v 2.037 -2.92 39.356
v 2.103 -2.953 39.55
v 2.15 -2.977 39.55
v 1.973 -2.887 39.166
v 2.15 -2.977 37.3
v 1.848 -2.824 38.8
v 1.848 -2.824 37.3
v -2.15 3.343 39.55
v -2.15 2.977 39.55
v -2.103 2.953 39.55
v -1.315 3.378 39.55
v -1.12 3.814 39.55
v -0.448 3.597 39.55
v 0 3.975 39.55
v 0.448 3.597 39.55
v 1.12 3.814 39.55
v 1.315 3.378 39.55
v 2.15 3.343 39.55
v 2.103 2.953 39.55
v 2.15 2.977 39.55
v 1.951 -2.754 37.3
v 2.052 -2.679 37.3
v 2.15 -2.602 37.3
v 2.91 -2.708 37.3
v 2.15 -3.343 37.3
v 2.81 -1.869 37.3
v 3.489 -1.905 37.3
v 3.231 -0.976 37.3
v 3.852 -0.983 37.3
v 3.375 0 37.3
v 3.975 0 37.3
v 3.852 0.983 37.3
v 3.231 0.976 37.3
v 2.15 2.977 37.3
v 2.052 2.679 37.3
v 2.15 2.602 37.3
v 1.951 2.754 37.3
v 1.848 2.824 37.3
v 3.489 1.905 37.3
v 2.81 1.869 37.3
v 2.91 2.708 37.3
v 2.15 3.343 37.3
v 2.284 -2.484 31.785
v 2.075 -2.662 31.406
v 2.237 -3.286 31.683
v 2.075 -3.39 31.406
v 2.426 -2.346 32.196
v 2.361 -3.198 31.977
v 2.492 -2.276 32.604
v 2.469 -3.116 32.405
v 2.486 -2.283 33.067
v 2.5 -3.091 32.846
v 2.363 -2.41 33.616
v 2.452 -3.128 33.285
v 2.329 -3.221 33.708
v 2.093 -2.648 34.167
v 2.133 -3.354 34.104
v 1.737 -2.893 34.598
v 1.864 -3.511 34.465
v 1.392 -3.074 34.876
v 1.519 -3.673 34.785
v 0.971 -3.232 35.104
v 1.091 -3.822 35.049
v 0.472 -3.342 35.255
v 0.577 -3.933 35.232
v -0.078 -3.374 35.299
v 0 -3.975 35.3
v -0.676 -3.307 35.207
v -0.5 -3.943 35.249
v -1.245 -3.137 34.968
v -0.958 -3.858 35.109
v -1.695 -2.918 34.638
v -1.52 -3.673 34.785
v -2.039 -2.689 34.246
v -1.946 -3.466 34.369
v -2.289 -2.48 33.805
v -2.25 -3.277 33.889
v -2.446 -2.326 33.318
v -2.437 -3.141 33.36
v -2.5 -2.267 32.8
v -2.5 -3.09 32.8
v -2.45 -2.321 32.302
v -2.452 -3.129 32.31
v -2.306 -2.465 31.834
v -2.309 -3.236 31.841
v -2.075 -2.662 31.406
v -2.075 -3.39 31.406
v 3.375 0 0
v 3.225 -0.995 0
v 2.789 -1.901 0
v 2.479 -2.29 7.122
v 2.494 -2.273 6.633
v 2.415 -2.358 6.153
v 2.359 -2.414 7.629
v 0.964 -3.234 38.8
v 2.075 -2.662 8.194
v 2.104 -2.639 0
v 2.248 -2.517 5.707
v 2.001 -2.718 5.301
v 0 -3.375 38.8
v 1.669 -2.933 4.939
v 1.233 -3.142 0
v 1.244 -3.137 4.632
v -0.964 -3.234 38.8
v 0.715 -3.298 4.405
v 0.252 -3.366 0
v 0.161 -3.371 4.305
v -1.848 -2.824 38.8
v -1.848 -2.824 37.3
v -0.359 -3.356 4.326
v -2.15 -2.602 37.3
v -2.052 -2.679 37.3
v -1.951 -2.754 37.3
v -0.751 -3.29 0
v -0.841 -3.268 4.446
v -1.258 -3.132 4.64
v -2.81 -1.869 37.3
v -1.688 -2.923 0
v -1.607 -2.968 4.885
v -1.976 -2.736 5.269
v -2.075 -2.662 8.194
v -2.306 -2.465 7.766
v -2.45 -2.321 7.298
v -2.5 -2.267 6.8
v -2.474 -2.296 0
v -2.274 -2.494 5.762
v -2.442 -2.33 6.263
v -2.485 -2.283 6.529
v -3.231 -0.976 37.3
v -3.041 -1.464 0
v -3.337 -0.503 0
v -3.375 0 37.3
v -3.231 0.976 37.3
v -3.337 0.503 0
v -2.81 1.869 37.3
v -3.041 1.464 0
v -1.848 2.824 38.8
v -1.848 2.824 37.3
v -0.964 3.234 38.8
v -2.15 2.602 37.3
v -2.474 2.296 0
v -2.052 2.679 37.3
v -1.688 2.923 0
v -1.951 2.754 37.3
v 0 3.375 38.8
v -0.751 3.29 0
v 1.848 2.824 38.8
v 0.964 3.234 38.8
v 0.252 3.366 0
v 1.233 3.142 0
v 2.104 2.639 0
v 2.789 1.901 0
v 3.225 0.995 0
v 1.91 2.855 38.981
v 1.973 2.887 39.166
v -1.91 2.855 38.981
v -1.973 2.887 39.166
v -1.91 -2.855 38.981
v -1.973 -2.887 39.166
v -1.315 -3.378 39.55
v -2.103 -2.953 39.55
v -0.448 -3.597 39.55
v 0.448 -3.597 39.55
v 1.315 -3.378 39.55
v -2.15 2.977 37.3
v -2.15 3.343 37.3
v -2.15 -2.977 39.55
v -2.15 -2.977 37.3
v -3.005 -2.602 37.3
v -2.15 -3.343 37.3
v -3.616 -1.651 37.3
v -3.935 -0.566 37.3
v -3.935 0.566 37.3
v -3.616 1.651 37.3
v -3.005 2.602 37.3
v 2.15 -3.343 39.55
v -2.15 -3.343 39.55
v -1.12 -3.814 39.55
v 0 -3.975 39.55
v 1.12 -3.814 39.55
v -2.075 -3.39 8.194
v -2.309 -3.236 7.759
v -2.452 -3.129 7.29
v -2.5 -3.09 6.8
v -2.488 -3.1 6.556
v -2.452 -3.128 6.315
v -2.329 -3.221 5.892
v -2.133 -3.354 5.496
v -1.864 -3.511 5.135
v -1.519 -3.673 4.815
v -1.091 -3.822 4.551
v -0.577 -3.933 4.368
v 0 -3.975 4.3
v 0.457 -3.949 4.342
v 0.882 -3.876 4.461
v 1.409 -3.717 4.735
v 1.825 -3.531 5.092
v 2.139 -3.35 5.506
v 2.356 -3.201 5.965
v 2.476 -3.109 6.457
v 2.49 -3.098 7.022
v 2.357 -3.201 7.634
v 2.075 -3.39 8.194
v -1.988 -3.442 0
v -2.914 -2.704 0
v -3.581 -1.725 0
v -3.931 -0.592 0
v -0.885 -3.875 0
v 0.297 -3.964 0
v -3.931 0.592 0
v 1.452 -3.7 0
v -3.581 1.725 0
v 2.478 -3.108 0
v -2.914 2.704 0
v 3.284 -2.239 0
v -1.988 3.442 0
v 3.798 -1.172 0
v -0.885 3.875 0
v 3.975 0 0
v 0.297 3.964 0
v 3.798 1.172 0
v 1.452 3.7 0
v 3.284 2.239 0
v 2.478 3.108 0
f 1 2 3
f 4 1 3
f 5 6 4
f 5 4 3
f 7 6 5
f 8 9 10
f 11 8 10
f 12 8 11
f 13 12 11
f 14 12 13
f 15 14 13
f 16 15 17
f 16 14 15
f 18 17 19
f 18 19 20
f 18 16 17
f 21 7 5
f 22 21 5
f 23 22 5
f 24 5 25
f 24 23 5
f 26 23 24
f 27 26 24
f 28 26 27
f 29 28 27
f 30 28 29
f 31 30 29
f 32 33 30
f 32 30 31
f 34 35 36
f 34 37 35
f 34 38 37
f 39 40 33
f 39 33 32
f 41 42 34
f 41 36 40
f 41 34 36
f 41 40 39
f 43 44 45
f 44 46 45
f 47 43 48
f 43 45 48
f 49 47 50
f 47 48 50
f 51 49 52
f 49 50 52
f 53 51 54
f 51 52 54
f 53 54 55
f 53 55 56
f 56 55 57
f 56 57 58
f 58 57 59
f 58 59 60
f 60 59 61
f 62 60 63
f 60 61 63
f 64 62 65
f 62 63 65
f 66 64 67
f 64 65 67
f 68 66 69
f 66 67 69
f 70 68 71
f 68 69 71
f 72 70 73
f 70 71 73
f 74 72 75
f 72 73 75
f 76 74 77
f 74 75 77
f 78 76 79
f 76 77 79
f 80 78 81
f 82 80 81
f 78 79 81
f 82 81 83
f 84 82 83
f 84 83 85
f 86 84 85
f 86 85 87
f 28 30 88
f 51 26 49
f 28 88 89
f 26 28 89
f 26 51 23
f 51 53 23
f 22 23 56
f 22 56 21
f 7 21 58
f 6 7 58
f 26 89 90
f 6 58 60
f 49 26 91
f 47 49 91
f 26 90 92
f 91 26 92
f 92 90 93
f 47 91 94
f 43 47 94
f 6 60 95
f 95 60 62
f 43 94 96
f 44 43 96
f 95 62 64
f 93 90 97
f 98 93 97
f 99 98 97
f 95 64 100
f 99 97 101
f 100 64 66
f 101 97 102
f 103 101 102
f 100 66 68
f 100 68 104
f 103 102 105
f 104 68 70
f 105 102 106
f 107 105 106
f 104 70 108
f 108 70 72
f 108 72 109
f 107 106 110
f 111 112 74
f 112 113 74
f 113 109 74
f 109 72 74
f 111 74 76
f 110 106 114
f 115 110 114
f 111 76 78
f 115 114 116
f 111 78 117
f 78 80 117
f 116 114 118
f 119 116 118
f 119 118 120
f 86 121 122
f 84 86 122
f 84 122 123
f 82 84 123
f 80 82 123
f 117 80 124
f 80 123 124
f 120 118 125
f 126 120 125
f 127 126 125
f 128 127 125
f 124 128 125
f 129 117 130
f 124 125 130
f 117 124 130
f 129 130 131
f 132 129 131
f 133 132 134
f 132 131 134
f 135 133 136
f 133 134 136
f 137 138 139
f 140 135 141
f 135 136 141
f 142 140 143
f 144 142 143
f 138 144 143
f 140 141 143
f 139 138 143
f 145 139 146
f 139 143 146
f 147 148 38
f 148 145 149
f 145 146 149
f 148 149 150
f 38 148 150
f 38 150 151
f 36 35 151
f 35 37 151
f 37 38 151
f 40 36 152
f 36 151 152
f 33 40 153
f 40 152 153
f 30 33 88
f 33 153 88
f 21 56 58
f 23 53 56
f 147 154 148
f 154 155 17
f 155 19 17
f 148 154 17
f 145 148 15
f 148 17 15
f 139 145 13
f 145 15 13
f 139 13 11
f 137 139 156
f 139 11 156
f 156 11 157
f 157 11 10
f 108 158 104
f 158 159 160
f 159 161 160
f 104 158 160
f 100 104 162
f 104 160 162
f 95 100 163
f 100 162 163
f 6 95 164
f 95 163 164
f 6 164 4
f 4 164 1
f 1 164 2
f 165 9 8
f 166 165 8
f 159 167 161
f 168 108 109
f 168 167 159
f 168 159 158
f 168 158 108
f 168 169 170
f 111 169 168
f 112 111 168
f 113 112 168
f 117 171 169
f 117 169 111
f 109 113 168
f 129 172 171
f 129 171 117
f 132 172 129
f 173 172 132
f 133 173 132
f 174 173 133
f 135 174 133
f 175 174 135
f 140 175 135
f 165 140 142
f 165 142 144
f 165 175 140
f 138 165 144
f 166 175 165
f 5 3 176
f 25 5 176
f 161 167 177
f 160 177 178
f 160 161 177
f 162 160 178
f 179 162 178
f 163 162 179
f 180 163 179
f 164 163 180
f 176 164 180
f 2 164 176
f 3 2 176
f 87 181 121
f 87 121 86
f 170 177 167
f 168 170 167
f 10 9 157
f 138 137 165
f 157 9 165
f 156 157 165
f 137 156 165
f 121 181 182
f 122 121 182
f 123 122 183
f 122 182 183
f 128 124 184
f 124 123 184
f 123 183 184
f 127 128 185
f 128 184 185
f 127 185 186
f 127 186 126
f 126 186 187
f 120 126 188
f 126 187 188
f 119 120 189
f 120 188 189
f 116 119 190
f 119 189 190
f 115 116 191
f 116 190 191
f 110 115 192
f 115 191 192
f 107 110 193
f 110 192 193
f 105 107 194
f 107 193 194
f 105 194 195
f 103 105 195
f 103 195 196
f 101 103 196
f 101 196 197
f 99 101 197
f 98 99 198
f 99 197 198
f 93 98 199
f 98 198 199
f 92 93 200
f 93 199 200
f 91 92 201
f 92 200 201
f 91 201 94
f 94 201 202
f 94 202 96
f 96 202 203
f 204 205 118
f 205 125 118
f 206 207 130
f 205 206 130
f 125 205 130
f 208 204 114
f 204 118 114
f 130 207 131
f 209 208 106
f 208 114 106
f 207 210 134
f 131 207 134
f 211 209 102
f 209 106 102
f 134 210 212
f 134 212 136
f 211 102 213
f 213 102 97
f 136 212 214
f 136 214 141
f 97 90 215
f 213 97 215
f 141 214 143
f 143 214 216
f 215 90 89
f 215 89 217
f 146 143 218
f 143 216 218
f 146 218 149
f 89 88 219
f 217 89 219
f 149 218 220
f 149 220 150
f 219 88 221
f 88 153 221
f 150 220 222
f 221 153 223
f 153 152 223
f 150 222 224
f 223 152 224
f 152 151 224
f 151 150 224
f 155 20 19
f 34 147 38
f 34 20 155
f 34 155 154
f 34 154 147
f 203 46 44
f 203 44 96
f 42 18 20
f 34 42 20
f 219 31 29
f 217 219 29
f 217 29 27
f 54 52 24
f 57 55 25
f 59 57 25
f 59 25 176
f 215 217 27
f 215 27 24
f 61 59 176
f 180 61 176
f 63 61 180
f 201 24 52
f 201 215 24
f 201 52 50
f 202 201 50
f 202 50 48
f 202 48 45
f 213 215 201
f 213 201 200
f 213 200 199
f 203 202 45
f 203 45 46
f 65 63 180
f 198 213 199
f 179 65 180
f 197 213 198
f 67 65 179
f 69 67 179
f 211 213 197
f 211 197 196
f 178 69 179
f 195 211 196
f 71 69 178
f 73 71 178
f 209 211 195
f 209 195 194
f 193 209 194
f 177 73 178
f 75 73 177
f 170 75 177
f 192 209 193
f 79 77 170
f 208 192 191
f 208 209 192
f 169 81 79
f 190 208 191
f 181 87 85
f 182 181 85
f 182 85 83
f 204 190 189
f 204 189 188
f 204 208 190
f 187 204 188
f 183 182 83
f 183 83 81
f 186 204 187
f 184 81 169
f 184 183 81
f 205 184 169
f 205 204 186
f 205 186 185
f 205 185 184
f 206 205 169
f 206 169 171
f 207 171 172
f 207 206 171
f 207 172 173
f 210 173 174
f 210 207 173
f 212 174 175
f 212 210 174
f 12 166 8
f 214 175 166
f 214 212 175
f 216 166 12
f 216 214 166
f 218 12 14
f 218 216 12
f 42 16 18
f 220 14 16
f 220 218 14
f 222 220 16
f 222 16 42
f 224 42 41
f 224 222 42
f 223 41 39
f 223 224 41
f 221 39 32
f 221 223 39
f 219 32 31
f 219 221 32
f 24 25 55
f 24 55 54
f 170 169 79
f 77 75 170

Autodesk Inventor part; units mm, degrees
ref_plane "YZ Plane" through (0, 0, 0) normal (1, 0, 0) x (0, 1, 0)
sketch "Sketch1" plane through (0, 0, 0) normal (0, 0, 1) x (1, 0, 0)
  circle A0 centre (0, 0) radius 3.975
  circle A1 centre (0, 0) radius 3.375
  dimension "d0" = 7.95
  dimension "d1" = 0.6
extrude "Extrusion1" add sketch "Sketch1" along normal blind 39.55
ref_plane "Work Plane1" through (0, -3.975, 0) normal (0, 1, 0) x (-1, 0, 0)
sketch "Sketch2" plane through (0, -3.975, 0) normal (0, 1, 0) x (-1, 0, 0)
  line L0 (0, 0) -> (0, 6.8) construction
  line L1 (0, 6.8) -> (0, 32.8) construction
  circle A0 centre (0, 32.8) radius 2.5
  circle A1 centre (0, 6.8) radius 2.5
  line L2 (2.075, 32.8) -> (-2.075, 32.8)
  line L3 (-2.075, 32.8) -> (-2.075, 6.8)
  line L4 (-2.075, 6.8) -> (2.075, 6.8)
  line L5 (2.075, 6.8) -> (2.075, 32.8)
  dimension "d4" = 6.8
  dimension "d5" = 26
  dimension "d6" = 5
  dimension "d7" = 4.15
extrude "Extrusion2" cut sketch "Sketch2" along normal up to surface
ref_plane "Work Plane2" through (0, 0, 37.3) normal (0, 0, -1) x (-1, 0, 0)
sketch "Sketch3" plane through (0, 0, 39.55) normal (0, 0, 1) x (1, 0, 0)
  circle A0 centre (0, 0) radius 3.375 projected
  circle A1 centre (0, 0) radius 3.975 projected
  line L0 (2.15, 4.5) -> (2.15, -4.5)
  line L1 (-2.15, -4.5) -> (-2.15, 4.5)
  line L2 (-2.15, 0) -> (2.15, 0) construction
  arc A2 (-2.15, 4.5) -> (-2.15, -4.5) centre (1.8186, 0) ccw
  arc A3 (2.15, -4.5) -> (2.15, 4.5) centre (-1.8186, 0) ccw
  point P0 (0, 0)
  dimension "d20" = 4.3
  dimension "d21" = 9
  dimension "d22" = 6
  dimension "d23" = 6
extrude "Extrusion3" cut sketch "Sketch3" against normal up to surface (2.25 mm away) contours A0 L0 | A0 L0 A1 | L1 A0 | A0 L1 A1 | L0 A3 A1 | A1 L1 A2
chamfer "Chamfer1" distance 0.25 distance2 0.75 2 edges at (0, -3.375, 39.55) (0, 3.375, 39.55) measured on face at (1.662, -3.3702, 39.55) measured on face at (1.662, 3.3702, 39.55)
chamfer "Chamfer2" distance 0.375 angle 45 4 edges at (2.15, -2.6016, 38.05) (2.15, 2.6016, 38.05) (-2.15, -2.6016, 38.05) (-2.15, 2.6016, 38.05)
properties part number "308-13" material "Steel, Mild"
